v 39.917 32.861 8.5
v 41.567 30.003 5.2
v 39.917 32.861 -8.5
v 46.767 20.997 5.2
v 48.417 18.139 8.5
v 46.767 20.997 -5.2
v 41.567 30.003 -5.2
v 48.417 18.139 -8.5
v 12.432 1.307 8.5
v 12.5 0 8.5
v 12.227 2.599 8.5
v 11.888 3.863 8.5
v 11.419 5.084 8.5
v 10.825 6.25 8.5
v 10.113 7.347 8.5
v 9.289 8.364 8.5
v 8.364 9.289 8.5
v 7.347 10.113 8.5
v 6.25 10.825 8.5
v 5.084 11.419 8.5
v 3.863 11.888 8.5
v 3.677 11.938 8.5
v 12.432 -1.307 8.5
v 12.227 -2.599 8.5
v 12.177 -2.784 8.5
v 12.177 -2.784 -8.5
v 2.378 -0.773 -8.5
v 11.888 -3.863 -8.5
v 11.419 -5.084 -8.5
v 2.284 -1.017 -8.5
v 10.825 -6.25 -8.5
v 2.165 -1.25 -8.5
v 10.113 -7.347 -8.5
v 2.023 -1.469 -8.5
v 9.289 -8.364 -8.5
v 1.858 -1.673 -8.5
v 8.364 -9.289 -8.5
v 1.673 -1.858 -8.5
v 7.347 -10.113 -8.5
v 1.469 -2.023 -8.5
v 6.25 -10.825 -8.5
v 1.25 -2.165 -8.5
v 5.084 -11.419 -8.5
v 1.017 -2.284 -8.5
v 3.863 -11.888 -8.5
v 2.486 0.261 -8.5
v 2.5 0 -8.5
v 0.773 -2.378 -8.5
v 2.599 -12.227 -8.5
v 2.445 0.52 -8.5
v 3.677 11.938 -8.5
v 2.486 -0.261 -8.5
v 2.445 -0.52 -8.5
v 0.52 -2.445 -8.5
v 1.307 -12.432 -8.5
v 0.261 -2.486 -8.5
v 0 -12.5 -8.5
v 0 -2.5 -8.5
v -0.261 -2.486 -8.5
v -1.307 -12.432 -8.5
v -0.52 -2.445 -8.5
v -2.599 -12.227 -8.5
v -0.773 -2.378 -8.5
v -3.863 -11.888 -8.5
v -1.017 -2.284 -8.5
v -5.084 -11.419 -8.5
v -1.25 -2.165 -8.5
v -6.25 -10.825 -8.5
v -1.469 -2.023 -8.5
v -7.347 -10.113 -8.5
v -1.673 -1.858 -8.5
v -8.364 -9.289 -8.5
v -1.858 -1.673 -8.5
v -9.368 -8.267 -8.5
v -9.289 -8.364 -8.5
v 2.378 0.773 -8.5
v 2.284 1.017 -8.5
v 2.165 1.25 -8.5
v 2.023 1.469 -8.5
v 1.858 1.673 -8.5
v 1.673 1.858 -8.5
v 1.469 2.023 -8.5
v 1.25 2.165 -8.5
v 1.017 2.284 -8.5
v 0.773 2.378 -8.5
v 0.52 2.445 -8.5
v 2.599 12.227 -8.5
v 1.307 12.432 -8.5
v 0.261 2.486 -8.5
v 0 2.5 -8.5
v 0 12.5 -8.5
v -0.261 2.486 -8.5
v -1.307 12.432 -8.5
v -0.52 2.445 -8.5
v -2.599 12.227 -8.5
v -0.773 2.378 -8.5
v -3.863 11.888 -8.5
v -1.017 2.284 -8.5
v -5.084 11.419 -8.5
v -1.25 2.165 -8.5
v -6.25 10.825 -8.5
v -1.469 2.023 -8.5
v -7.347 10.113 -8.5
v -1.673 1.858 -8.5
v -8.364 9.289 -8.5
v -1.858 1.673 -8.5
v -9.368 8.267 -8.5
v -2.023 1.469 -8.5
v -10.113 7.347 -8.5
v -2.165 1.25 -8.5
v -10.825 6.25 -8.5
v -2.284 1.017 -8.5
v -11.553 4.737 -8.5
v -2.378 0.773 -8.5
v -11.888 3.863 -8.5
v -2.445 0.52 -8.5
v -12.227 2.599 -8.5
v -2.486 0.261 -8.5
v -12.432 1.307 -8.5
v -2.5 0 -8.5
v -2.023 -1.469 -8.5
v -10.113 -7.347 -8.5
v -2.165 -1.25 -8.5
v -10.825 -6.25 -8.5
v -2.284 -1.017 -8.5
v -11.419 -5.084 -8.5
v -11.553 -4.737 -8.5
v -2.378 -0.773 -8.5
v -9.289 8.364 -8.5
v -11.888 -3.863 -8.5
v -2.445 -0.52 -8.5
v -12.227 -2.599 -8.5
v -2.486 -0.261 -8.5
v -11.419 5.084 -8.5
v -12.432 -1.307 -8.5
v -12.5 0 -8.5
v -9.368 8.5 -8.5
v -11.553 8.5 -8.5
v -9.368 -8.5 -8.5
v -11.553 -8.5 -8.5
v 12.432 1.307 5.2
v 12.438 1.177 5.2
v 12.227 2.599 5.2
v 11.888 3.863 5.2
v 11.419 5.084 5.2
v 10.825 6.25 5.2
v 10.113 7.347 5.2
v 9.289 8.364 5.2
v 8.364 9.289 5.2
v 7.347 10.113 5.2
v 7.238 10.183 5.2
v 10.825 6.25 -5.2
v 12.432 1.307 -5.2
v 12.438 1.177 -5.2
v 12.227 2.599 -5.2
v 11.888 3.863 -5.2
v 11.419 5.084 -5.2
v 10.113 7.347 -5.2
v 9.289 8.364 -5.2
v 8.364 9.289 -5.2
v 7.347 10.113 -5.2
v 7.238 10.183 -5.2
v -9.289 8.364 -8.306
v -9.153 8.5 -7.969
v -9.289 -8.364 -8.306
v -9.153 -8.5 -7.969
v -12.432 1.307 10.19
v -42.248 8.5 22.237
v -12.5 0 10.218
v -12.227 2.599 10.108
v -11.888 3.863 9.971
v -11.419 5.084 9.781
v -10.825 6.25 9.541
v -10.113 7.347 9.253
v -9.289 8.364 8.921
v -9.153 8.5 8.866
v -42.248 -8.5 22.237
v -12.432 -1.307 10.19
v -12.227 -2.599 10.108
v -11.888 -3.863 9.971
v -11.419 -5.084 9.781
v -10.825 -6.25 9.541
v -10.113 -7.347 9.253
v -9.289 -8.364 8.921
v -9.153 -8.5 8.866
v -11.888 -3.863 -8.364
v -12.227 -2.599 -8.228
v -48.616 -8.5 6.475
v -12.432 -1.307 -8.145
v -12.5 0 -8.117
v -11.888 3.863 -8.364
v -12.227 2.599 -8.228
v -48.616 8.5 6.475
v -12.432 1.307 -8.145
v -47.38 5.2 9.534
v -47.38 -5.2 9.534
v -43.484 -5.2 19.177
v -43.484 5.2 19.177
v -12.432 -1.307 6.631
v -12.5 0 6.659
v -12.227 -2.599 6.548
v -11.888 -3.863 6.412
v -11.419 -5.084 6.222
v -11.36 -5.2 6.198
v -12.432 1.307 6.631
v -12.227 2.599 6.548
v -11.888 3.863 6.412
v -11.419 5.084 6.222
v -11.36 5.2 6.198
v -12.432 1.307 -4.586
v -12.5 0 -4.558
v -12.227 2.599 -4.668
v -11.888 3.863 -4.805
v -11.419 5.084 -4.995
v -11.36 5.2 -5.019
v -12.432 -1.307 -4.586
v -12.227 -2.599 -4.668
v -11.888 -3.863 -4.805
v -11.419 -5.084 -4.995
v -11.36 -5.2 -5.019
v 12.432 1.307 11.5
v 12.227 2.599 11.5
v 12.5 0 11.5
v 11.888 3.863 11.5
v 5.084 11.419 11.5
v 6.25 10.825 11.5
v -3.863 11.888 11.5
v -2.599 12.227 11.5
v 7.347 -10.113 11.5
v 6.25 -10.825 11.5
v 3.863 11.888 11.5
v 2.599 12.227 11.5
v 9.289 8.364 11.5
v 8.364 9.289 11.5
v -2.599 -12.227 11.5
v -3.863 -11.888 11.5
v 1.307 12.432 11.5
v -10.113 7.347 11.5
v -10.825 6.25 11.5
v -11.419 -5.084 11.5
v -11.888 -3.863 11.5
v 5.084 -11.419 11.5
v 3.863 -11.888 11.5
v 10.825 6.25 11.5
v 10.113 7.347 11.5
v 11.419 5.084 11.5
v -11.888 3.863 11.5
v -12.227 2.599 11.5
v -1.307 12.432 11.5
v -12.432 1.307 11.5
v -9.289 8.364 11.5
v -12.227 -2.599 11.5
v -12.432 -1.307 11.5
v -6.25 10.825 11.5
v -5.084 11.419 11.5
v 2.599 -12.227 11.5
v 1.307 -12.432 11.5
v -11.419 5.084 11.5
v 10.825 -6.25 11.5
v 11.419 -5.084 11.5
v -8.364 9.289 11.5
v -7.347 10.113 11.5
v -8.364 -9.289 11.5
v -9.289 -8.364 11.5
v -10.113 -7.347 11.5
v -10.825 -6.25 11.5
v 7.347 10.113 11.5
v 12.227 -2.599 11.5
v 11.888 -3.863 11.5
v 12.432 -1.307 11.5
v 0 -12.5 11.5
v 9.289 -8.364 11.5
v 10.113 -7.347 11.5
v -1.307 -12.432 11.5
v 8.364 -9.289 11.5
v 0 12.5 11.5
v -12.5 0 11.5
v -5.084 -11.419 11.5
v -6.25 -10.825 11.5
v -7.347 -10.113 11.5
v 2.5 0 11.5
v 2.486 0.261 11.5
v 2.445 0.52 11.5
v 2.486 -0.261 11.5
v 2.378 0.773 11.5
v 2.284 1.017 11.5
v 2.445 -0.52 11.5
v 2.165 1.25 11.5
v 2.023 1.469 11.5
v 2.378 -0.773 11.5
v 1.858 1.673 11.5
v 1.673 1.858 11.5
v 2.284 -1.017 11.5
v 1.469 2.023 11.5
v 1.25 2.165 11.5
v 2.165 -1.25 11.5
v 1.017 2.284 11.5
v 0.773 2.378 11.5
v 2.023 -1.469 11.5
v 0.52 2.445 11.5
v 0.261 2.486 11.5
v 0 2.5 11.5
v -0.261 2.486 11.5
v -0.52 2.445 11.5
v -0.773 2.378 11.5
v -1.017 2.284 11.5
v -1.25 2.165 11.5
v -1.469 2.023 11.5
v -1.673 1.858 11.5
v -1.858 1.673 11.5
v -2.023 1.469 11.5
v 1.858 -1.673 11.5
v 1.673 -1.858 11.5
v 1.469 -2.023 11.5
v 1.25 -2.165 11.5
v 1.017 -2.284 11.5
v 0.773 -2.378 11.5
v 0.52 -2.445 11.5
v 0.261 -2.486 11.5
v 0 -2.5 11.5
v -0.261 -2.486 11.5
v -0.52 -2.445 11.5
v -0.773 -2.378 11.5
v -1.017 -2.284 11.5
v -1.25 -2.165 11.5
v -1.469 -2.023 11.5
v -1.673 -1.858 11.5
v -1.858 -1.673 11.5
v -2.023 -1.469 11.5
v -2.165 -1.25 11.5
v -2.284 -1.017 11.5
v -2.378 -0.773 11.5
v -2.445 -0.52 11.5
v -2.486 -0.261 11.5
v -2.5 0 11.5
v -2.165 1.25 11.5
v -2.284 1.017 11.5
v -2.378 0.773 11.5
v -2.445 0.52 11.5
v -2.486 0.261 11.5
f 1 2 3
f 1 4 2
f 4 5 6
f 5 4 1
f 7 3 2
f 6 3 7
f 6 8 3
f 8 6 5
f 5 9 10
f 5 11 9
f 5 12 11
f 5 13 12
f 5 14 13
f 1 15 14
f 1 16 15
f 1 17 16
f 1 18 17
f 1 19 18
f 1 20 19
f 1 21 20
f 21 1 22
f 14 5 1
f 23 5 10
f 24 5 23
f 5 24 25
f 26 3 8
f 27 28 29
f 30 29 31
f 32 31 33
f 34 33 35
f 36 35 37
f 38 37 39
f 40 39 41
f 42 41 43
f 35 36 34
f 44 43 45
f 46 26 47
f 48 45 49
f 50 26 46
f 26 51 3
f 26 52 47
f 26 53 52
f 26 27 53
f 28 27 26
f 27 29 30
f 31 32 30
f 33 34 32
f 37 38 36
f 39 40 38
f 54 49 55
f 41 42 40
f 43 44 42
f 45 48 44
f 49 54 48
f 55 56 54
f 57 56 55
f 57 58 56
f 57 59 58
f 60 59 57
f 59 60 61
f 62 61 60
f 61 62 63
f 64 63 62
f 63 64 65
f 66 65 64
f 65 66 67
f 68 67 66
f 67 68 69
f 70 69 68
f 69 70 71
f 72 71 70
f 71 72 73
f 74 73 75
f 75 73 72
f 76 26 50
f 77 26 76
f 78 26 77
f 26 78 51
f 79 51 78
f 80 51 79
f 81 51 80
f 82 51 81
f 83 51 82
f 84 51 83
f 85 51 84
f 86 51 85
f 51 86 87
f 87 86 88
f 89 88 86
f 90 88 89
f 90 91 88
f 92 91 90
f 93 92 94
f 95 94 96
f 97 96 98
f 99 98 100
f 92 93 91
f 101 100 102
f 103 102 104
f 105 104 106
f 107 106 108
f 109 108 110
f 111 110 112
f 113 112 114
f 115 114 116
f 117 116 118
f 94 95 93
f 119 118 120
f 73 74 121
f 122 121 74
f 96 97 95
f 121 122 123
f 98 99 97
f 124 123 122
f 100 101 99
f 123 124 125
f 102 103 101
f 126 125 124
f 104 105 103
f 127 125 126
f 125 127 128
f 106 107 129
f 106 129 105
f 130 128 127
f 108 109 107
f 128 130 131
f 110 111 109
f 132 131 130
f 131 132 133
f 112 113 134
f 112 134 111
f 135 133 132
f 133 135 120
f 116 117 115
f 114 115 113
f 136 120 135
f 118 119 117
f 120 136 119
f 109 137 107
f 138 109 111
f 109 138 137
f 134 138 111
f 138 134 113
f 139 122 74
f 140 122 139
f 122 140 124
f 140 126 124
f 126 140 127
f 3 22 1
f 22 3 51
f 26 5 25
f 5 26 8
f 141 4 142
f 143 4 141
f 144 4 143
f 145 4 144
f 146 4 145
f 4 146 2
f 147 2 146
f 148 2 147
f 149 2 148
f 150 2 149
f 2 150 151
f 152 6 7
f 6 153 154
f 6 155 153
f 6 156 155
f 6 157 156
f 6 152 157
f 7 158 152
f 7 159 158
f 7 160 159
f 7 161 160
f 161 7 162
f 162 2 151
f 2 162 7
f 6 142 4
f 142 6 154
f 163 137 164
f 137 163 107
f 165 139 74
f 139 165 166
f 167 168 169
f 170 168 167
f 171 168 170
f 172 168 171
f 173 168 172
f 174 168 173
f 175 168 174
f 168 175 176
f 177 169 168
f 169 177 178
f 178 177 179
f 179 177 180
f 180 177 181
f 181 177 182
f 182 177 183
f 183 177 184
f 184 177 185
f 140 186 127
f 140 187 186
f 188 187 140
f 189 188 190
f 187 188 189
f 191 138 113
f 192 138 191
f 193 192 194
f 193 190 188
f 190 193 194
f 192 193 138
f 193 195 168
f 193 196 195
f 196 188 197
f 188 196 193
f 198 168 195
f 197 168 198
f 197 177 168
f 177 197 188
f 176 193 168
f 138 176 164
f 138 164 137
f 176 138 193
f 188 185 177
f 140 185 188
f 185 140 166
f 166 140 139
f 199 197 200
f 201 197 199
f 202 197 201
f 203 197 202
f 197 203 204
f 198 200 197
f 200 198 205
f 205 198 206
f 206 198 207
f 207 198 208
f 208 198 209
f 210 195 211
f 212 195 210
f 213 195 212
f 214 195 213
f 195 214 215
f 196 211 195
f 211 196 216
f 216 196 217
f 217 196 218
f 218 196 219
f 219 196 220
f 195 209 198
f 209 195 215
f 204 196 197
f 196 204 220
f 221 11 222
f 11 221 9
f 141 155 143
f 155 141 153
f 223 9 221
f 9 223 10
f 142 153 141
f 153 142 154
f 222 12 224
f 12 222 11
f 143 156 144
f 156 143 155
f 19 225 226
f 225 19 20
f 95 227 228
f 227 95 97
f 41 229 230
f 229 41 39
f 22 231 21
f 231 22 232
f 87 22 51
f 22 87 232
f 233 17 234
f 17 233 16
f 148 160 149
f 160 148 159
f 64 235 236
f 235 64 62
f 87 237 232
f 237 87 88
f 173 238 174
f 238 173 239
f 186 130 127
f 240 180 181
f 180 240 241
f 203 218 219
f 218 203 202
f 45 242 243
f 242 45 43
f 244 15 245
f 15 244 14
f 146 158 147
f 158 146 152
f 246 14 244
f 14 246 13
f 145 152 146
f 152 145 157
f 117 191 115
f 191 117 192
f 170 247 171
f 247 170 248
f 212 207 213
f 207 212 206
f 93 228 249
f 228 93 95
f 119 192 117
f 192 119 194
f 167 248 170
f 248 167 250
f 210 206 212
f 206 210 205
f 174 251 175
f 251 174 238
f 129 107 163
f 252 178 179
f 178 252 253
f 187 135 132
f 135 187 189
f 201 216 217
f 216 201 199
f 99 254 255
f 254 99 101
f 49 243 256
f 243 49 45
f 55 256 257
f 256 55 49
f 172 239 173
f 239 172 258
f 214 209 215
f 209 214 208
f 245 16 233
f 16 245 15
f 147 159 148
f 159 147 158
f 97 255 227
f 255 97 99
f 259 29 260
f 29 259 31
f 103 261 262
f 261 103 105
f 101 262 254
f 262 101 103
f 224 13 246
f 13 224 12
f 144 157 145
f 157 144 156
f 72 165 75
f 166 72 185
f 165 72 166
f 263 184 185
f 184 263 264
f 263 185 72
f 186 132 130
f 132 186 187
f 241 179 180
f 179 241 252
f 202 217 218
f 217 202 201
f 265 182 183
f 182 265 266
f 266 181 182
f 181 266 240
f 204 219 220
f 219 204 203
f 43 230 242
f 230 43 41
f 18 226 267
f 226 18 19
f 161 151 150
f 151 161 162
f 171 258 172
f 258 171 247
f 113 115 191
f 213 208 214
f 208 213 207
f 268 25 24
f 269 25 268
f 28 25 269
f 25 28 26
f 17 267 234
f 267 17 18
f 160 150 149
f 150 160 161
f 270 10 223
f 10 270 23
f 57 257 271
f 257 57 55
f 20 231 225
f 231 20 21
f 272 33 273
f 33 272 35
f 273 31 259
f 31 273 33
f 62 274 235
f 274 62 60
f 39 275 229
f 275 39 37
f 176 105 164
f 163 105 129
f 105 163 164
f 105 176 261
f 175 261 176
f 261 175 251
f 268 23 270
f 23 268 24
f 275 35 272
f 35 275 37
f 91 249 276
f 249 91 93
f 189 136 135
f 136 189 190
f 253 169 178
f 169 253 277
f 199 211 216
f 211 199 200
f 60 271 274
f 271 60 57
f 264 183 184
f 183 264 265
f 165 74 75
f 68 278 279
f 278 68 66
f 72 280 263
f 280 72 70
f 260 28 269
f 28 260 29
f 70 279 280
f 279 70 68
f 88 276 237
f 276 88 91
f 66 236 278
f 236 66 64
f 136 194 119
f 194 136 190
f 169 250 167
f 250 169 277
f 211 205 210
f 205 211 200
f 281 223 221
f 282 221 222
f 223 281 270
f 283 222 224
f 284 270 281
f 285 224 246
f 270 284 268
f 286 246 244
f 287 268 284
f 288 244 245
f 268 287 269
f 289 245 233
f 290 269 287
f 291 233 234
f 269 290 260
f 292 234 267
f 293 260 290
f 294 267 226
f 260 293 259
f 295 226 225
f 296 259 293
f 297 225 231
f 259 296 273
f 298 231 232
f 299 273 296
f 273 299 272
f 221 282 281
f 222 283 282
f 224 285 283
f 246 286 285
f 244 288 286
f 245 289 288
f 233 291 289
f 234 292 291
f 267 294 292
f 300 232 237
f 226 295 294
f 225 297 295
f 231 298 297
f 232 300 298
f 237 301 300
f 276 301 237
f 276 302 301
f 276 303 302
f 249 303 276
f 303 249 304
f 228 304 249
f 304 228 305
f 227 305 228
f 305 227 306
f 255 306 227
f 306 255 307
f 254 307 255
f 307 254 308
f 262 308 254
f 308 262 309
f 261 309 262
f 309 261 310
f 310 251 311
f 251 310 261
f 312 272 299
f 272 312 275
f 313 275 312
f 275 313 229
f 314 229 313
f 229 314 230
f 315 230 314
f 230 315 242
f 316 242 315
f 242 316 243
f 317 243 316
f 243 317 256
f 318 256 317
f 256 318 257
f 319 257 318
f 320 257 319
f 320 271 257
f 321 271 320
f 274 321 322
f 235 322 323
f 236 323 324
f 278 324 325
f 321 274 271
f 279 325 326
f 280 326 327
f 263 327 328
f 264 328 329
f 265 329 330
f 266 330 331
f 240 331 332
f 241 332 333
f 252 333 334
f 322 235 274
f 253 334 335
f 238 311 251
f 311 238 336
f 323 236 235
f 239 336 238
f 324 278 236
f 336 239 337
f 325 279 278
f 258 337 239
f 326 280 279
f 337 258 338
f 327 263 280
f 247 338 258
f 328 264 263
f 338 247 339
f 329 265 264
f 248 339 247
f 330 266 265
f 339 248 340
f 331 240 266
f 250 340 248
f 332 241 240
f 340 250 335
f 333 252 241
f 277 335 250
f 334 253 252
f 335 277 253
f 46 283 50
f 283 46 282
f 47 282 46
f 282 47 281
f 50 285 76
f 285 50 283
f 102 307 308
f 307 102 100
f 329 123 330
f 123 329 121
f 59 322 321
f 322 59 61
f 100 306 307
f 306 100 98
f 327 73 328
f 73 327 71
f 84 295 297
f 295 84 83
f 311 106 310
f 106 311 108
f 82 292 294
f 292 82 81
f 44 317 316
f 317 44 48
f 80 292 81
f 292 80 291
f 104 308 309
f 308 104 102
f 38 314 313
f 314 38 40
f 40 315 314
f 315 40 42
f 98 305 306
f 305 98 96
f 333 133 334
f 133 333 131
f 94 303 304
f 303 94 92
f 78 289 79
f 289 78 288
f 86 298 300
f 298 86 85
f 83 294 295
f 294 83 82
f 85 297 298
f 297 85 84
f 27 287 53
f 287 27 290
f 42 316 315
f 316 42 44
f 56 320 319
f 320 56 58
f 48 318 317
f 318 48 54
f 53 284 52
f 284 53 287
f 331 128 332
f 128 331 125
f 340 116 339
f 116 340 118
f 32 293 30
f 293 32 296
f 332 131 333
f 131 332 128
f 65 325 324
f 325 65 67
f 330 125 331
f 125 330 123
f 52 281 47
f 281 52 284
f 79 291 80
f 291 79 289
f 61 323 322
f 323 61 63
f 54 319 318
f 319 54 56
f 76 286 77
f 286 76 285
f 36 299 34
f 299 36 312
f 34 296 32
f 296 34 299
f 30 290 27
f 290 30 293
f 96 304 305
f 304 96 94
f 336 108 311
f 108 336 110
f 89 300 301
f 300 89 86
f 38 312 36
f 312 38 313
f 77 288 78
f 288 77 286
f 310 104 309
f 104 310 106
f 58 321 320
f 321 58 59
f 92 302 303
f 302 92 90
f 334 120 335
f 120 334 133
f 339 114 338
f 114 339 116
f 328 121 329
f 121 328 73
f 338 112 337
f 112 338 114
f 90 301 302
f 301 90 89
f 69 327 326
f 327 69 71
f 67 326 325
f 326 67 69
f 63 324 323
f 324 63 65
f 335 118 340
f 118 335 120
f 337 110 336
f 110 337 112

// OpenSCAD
rotate([0,0,30])
translate([30,0,0])
difference(){
cube([42,17,17],center=true);
cube([43,10.4,10.4],center=true);
}

difference(){
translate([0,0,-4])
//rotate([0,0,14])
rotate([0,22,0])
translate([-28,0,0])
difference(){
cube([42,17,17],center=true);
cube([43,10.4,10.4],center=true);
}
translate([0,0,-18.5])
cylinder(d=30,h=10);
}

$fn=60;
translate([0,0,-8.5])
difference(){
cylinder(d=25,h=20);
cylinder(d=5,h=20);
}
